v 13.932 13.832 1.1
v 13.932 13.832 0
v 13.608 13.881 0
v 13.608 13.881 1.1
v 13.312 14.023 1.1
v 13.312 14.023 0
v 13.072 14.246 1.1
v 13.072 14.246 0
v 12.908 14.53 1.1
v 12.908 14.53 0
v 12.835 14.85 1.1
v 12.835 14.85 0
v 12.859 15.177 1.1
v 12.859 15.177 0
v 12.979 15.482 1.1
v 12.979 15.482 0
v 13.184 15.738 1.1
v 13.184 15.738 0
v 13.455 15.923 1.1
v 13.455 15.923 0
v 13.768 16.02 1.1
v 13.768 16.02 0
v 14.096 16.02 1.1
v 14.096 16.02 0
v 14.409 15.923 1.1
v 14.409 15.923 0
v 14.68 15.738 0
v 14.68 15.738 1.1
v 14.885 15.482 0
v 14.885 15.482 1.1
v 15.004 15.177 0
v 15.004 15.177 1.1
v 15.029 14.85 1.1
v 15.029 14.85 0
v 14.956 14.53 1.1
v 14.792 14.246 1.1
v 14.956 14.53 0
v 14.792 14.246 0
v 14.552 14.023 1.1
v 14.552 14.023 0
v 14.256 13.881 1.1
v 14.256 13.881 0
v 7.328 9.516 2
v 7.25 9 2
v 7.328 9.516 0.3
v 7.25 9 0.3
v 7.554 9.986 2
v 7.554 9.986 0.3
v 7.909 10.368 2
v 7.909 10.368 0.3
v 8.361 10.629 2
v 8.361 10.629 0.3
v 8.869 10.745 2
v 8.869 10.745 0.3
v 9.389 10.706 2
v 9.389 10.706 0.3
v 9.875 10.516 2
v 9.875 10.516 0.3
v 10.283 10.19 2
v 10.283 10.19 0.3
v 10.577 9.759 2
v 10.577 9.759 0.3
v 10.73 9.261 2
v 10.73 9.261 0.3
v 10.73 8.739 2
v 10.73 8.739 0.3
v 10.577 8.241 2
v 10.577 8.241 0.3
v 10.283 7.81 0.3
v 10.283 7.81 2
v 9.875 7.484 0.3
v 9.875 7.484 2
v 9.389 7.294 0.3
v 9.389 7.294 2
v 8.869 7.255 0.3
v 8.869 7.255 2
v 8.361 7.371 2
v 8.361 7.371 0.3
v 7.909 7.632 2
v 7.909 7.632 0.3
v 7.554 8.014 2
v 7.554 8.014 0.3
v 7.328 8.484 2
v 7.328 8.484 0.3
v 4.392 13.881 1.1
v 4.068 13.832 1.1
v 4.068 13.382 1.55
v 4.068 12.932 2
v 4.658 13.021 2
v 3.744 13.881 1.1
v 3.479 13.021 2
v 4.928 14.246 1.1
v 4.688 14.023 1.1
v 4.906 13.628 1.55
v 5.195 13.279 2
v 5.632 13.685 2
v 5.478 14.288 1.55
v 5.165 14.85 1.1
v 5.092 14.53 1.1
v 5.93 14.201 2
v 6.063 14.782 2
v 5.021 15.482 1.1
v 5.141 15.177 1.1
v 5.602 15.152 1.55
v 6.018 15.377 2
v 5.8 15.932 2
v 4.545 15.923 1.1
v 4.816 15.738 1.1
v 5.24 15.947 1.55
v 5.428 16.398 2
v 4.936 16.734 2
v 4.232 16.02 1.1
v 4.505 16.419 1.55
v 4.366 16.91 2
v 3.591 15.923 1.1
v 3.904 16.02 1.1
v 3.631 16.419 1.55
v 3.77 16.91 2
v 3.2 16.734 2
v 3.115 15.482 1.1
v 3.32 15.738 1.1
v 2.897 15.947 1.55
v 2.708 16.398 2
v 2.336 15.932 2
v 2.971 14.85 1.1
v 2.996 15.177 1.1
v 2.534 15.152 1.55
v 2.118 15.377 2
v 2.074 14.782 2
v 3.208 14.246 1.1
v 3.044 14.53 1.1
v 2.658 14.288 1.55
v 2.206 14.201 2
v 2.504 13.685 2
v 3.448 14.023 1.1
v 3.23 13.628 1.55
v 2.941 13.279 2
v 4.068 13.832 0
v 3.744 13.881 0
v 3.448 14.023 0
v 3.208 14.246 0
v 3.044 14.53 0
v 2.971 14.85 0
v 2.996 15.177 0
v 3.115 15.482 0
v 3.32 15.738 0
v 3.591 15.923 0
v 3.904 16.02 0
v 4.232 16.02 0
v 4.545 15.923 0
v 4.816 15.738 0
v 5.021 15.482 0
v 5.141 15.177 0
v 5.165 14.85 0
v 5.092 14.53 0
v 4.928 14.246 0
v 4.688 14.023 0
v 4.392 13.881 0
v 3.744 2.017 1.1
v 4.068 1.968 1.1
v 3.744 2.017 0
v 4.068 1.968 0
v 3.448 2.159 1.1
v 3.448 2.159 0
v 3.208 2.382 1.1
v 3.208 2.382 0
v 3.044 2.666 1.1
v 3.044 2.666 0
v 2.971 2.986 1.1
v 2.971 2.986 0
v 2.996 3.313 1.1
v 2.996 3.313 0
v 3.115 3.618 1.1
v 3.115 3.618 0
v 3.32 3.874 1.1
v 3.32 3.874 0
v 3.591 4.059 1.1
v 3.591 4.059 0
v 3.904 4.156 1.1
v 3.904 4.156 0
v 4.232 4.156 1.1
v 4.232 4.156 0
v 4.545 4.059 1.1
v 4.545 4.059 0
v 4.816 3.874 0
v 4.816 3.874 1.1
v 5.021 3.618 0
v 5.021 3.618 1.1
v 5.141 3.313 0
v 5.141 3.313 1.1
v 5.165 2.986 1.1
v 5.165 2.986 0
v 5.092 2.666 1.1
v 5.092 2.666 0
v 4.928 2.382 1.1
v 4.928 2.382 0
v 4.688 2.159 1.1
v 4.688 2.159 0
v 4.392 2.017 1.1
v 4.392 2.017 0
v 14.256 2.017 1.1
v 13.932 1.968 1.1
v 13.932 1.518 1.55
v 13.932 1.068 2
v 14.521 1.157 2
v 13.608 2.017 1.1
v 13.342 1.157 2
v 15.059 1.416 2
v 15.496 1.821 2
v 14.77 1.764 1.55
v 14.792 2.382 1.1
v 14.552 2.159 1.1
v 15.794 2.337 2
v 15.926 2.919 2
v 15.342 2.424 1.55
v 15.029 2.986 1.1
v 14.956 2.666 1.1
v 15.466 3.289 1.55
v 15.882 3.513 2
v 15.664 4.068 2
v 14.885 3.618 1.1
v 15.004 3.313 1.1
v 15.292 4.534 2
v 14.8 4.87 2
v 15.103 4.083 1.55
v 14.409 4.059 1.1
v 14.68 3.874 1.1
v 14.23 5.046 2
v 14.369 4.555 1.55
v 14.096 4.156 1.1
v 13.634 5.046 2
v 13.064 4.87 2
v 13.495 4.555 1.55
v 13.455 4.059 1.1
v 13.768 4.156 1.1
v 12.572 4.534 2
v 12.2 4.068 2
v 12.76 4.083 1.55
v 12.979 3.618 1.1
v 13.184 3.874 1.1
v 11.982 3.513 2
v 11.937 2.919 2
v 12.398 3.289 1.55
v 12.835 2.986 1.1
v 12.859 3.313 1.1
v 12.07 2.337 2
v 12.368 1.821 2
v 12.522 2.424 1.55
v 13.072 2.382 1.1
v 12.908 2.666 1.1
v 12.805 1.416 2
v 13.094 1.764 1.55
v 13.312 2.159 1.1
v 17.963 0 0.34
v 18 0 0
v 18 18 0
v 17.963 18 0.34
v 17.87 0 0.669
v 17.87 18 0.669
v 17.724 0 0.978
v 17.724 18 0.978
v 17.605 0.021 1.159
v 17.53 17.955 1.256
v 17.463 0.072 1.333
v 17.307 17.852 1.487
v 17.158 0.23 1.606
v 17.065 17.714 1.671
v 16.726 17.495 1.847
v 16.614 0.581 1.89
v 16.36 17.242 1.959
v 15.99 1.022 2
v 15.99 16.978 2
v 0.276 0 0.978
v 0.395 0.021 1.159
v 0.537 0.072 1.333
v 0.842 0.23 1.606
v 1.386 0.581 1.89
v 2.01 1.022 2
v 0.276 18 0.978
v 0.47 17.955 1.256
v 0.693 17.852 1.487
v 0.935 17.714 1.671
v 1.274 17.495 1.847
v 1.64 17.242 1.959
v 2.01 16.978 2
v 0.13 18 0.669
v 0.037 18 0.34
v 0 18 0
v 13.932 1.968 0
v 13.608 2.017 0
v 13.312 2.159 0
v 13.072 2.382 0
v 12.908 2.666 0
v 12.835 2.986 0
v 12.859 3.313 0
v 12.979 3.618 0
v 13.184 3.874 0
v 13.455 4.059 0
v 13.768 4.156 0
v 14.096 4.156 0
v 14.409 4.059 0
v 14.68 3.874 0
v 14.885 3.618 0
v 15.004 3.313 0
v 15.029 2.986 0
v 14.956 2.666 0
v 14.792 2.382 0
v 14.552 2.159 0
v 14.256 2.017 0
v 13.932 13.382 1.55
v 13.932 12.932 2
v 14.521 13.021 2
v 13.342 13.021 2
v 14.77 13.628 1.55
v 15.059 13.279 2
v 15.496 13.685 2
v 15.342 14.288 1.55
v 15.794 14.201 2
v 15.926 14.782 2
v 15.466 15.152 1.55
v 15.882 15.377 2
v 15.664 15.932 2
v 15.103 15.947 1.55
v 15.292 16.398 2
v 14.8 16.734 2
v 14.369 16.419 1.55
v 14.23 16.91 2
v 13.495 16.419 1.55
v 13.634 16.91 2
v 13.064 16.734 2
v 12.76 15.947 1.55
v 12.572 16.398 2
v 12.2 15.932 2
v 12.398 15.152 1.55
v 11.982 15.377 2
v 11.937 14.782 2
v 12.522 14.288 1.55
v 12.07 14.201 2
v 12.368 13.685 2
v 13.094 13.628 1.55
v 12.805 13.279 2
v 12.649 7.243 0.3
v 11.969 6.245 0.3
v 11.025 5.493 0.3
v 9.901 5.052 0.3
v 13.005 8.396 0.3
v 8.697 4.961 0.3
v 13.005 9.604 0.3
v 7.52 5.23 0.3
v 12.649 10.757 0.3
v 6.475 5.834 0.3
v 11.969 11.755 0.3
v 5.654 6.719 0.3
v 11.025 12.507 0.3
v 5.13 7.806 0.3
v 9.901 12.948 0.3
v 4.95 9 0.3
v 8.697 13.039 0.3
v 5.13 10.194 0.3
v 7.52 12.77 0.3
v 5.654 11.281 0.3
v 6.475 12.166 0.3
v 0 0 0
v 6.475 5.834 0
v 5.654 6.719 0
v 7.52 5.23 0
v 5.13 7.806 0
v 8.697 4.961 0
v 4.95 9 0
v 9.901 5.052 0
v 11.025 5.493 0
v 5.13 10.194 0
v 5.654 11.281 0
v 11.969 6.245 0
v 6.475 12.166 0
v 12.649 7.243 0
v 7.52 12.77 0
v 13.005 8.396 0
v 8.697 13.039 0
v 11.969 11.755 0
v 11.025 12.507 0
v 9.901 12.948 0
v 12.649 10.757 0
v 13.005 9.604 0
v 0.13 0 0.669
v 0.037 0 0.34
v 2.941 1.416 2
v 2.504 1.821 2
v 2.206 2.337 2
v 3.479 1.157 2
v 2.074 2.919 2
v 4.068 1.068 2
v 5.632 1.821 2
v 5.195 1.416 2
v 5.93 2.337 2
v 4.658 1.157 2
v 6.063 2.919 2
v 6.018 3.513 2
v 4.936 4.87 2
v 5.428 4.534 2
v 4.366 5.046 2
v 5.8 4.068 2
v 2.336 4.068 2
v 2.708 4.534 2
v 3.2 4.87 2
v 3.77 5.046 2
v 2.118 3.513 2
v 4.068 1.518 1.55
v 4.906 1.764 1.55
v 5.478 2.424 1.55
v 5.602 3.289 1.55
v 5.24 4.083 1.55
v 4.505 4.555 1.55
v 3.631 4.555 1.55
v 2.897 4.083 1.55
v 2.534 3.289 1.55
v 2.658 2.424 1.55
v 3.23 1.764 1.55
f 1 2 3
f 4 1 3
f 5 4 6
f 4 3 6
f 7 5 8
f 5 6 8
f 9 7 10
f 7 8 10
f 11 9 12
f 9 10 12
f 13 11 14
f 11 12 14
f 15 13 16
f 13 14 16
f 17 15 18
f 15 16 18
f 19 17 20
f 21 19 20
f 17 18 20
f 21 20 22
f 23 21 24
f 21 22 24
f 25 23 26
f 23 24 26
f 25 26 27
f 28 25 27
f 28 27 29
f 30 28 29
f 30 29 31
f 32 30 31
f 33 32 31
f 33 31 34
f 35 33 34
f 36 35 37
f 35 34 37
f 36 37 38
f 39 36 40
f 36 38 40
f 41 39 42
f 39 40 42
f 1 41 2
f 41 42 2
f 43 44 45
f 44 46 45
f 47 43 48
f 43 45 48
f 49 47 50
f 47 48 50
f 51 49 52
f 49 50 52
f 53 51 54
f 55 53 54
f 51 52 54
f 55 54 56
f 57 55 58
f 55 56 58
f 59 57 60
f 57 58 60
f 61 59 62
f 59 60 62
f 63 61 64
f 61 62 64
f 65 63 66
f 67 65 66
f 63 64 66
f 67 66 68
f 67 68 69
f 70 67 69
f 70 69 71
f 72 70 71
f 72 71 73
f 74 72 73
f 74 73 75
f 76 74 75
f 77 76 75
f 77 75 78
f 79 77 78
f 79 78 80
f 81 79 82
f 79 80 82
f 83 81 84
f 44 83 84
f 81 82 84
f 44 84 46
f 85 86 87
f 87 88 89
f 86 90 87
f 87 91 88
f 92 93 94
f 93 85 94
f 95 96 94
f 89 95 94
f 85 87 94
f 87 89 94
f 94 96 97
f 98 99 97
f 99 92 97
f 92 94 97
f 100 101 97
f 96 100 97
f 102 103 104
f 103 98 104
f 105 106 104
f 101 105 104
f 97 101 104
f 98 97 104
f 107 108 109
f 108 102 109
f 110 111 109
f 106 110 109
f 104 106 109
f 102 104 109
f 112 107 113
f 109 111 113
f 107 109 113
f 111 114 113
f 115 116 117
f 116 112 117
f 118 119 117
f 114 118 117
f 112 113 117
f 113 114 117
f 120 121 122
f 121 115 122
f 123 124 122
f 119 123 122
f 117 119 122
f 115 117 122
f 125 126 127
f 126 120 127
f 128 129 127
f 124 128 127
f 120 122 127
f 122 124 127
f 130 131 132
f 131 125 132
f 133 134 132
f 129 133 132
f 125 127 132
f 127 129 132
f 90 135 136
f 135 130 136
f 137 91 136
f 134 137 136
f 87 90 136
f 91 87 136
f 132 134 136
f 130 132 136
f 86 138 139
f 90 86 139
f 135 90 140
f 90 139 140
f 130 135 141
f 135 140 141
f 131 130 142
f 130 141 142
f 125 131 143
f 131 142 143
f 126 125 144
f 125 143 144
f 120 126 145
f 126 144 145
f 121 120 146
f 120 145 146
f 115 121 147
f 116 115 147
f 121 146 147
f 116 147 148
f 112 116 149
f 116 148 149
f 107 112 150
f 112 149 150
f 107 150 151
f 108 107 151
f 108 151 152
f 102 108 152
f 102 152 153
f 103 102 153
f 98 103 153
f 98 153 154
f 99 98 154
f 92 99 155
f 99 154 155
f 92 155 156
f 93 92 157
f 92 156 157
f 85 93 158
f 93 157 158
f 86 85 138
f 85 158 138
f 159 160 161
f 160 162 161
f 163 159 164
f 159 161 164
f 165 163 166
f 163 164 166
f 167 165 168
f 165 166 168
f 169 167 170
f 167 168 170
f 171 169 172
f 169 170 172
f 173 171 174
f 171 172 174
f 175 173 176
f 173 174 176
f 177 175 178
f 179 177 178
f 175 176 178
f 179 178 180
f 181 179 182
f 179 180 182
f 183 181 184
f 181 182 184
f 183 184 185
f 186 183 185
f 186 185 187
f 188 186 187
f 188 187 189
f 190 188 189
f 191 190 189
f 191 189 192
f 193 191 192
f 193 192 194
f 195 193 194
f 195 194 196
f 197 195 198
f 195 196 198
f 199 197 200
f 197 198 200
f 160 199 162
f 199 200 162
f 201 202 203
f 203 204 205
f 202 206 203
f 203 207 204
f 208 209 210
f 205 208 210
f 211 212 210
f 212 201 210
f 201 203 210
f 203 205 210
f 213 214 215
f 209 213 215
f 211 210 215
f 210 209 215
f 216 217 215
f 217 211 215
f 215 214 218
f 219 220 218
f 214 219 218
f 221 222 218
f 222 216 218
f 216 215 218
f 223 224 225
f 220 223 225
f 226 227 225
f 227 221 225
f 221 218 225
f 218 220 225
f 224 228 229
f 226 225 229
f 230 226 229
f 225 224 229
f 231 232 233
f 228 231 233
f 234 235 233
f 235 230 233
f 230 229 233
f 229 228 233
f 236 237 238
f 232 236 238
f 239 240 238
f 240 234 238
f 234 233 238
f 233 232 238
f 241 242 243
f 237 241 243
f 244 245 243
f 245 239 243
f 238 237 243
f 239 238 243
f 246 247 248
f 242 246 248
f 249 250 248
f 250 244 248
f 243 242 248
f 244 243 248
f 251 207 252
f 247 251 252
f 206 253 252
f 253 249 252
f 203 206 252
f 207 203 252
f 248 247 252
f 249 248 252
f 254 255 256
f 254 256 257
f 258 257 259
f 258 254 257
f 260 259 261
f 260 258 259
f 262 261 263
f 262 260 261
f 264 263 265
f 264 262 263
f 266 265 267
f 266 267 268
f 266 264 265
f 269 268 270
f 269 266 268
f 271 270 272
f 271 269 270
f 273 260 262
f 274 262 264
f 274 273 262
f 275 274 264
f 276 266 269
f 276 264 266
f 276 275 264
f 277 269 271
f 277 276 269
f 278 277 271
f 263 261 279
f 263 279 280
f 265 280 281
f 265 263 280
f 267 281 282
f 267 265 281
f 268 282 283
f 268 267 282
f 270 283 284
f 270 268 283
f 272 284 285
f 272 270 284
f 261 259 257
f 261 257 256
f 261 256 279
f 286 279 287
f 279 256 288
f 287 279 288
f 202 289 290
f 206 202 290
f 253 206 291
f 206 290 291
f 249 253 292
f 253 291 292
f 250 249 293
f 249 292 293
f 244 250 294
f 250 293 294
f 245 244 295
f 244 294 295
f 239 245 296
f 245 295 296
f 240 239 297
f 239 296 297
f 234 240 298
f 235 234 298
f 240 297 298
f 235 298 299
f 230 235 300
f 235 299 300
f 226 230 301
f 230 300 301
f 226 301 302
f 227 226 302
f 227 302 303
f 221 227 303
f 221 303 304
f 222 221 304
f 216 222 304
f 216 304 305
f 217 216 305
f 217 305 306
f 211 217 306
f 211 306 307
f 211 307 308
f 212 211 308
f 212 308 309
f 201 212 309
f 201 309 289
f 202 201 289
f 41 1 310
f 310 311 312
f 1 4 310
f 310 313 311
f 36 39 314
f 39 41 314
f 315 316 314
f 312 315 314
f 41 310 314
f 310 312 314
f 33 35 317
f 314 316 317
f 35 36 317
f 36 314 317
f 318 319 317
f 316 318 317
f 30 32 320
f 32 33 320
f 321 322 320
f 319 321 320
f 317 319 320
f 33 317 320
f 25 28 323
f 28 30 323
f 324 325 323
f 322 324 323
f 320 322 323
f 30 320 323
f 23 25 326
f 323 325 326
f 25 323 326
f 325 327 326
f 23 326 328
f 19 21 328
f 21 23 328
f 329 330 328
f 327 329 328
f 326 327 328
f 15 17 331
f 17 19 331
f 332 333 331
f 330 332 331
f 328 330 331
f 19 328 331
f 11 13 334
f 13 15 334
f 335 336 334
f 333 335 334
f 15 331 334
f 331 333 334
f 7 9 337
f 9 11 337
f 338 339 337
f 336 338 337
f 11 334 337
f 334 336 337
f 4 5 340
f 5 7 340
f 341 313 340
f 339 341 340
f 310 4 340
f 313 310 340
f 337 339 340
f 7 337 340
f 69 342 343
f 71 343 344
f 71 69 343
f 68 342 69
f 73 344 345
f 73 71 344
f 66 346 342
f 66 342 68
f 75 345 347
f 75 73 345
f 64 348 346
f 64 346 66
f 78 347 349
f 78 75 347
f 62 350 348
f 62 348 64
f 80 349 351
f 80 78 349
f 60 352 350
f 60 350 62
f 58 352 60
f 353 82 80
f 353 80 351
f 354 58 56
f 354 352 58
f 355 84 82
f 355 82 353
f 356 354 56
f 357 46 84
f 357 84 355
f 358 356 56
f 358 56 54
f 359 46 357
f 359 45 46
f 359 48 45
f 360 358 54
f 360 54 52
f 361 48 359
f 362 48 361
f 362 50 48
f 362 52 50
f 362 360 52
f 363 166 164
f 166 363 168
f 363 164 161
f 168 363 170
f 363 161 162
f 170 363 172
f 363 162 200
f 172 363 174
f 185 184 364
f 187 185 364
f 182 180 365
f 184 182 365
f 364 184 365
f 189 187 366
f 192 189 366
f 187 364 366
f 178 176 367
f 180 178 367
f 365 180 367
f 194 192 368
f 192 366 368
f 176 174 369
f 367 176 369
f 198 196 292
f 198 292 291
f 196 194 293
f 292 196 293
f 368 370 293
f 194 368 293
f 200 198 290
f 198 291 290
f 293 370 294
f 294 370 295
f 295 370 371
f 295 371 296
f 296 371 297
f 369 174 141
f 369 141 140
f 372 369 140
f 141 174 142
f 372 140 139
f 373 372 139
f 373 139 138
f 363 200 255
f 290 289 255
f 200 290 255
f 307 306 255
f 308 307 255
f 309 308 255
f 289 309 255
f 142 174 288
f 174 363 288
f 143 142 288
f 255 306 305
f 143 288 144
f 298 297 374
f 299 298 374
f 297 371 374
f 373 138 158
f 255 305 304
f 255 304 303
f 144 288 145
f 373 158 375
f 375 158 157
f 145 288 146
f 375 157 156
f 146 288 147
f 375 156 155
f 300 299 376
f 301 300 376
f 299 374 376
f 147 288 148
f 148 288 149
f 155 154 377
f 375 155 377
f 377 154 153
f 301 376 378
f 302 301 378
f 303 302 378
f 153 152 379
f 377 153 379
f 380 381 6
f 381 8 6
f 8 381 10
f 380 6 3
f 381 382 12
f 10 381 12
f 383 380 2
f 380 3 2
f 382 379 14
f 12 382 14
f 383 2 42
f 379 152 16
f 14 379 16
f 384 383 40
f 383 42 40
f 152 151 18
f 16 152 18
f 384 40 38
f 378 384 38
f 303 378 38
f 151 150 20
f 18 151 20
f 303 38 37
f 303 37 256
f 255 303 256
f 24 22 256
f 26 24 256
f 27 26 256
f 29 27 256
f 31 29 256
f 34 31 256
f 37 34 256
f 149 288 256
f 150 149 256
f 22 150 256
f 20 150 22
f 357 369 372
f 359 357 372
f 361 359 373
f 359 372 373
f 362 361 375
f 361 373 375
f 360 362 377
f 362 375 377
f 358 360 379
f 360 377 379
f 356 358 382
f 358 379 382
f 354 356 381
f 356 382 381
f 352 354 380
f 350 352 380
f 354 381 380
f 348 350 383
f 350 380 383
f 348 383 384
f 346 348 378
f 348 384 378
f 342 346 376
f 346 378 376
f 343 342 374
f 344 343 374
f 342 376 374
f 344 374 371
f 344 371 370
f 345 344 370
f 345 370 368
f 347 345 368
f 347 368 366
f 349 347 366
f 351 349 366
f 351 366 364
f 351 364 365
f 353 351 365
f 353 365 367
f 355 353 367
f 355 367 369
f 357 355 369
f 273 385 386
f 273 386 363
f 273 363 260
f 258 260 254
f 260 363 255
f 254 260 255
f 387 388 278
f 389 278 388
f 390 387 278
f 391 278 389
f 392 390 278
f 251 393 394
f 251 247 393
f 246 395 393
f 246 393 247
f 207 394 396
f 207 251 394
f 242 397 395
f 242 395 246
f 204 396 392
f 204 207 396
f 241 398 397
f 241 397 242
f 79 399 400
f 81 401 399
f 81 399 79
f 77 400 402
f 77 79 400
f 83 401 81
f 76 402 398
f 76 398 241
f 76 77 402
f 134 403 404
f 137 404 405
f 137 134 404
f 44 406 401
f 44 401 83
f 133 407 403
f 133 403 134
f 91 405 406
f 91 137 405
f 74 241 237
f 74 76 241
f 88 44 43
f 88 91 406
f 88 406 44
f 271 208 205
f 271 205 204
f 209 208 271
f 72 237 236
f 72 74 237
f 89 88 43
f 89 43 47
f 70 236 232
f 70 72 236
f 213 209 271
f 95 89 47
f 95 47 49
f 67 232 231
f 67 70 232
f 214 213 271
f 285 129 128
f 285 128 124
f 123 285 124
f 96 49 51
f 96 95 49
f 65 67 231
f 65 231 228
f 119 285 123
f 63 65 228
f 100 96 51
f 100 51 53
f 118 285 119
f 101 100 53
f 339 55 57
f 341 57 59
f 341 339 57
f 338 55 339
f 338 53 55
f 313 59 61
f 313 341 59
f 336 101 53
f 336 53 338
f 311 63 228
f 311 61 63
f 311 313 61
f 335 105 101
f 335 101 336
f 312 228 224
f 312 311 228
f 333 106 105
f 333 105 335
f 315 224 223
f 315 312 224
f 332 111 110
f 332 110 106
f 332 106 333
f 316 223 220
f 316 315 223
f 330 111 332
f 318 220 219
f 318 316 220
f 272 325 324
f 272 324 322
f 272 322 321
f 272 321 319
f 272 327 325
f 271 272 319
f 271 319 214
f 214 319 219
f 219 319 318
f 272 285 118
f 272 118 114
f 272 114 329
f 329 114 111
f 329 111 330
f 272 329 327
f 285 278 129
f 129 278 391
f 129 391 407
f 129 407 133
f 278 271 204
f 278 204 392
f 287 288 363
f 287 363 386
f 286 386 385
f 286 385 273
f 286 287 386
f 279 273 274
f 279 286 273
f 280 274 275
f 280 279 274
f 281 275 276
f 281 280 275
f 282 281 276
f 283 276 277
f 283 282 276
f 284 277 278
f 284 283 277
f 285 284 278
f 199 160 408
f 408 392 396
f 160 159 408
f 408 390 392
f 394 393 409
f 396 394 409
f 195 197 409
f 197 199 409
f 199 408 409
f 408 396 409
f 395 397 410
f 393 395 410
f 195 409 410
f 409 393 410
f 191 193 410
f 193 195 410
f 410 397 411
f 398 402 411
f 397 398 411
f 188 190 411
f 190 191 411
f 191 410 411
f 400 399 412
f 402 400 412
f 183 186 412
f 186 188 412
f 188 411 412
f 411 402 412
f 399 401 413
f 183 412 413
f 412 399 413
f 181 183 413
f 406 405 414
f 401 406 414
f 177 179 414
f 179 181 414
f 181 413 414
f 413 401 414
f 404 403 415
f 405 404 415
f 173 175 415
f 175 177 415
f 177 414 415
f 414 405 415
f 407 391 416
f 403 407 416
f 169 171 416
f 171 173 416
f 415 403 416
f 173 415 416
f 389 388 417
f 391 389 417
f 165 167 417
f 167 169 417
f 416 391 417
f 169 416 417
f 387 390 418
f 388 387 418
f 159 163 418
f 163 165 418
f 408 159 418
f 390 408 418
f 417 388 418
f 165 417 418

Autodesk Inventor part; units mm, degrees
ref_plane "YZ Plane" through (0, 0, 0) normal (1, 0, 0) x (0, 1, 0)
ref_plane "XZ Plane" through (0, 0, 0) normal (0, 1, 0) x (-1, 0, 0)
ref_plane "XY Plane" through (0, 0, 0) normal (0, 0, 1) x (1, 0, 0)
sketch "Эскиз1" plane through (0, 0, 0) normal (0, 0, 1) x (1, 0, 0)
  line L0 (0, 0) -> (18, 0)
  line L1 (18, 0) -> (18, 18)
  line L2 (18, 18) -> (0, 18)
  line L3 (0, 18) -> (0, 0)
  dimension "d0" = 18
  dimension "d1" = 18
extrude "Выдавливание1" add sketch "Эскиз1" along normal blind 2
sketch "Эскиз4" plane through (0, 0, 0) normal (0, 0, -1) x (-1, 0, 0)
  circle A0 centre (-9, 9) radius 4.05
  line L0 (-18, 0) -> (-18, 18) projected
  line L1 (-18, 9) -> (0, 9)
  line L2 (0, 18) -> (0, 0) projected
  dimension "d14" = 8.1
extrude "Выдавливание3" cut sketch "Эскиз4" against normal blind 0.3
sketch "Эскиз5" plane through (0, 0, 2) normal (0, 0, 1) x (1, 0, 0)
  circle A0 centre (9, 9) radius 1.75 projected
  circle A1 centre (9, 9) radius 5.714 projected
  line L0 (0, 18) -> (0, 0) projected
  line L1 (6.1362, 11.8638) -> (0, 18)
  line L2 (18, 0) -> (18, 18) projected
  line L3 (11.8638, 11.8638) -> (18, 18)
  line L4 (0, 0) -> (18, 0) projected
  line L5 (0, 0) -> (6.1362, 6.1362)
  line L6 (18, 0) -> (11.8638, 6.1362)
  circle A2 centre (9, 9) radius 4.05 projected
  line L7 (3.0681, 14.9319) -> (4.0681, 14.9319)
  line L8 (3.0681, 3.0681) -> (4.0681, 3.0681)
  line L9 (14.9319, 3.0681) -> (13.9319, 3.0681)
  line L10 (14.9319, 14.9319) -> (13.9319, 14.9319)
  dimension "d24" = 1
hole "Отверстие2" at (4.0681, 14.9319, 2) at (4.0681, 3.0681, 2) at (13.9319, 14.9319, 2) at (13.9319, 3.0681, 2) direction (0, 0, -1) diameter 2.2 depth 5 countersink diameter 4 countersink angle 90
fillet "Сопряжение1" radius 1.05 2 edges at (9, 0, 2) (9, 18, 2)
fillet "Сопряжение1" radius 2.05 2 edges at (18, 9, 2) (0, 9, 2)
sketch "Эскиз6" plane through (9, 9, 0.3) normal (0, 0, -1) x (-1, 0, 0)
  circle A0 centre (0, 0) radius 1.75
  point P0 (9, -9)
  dimension "d27" = 3.5
extrude "Выдавливание4" cut sketch "Эскиз6" against normal through all
properties part number "Крышка поворотного кулака"
